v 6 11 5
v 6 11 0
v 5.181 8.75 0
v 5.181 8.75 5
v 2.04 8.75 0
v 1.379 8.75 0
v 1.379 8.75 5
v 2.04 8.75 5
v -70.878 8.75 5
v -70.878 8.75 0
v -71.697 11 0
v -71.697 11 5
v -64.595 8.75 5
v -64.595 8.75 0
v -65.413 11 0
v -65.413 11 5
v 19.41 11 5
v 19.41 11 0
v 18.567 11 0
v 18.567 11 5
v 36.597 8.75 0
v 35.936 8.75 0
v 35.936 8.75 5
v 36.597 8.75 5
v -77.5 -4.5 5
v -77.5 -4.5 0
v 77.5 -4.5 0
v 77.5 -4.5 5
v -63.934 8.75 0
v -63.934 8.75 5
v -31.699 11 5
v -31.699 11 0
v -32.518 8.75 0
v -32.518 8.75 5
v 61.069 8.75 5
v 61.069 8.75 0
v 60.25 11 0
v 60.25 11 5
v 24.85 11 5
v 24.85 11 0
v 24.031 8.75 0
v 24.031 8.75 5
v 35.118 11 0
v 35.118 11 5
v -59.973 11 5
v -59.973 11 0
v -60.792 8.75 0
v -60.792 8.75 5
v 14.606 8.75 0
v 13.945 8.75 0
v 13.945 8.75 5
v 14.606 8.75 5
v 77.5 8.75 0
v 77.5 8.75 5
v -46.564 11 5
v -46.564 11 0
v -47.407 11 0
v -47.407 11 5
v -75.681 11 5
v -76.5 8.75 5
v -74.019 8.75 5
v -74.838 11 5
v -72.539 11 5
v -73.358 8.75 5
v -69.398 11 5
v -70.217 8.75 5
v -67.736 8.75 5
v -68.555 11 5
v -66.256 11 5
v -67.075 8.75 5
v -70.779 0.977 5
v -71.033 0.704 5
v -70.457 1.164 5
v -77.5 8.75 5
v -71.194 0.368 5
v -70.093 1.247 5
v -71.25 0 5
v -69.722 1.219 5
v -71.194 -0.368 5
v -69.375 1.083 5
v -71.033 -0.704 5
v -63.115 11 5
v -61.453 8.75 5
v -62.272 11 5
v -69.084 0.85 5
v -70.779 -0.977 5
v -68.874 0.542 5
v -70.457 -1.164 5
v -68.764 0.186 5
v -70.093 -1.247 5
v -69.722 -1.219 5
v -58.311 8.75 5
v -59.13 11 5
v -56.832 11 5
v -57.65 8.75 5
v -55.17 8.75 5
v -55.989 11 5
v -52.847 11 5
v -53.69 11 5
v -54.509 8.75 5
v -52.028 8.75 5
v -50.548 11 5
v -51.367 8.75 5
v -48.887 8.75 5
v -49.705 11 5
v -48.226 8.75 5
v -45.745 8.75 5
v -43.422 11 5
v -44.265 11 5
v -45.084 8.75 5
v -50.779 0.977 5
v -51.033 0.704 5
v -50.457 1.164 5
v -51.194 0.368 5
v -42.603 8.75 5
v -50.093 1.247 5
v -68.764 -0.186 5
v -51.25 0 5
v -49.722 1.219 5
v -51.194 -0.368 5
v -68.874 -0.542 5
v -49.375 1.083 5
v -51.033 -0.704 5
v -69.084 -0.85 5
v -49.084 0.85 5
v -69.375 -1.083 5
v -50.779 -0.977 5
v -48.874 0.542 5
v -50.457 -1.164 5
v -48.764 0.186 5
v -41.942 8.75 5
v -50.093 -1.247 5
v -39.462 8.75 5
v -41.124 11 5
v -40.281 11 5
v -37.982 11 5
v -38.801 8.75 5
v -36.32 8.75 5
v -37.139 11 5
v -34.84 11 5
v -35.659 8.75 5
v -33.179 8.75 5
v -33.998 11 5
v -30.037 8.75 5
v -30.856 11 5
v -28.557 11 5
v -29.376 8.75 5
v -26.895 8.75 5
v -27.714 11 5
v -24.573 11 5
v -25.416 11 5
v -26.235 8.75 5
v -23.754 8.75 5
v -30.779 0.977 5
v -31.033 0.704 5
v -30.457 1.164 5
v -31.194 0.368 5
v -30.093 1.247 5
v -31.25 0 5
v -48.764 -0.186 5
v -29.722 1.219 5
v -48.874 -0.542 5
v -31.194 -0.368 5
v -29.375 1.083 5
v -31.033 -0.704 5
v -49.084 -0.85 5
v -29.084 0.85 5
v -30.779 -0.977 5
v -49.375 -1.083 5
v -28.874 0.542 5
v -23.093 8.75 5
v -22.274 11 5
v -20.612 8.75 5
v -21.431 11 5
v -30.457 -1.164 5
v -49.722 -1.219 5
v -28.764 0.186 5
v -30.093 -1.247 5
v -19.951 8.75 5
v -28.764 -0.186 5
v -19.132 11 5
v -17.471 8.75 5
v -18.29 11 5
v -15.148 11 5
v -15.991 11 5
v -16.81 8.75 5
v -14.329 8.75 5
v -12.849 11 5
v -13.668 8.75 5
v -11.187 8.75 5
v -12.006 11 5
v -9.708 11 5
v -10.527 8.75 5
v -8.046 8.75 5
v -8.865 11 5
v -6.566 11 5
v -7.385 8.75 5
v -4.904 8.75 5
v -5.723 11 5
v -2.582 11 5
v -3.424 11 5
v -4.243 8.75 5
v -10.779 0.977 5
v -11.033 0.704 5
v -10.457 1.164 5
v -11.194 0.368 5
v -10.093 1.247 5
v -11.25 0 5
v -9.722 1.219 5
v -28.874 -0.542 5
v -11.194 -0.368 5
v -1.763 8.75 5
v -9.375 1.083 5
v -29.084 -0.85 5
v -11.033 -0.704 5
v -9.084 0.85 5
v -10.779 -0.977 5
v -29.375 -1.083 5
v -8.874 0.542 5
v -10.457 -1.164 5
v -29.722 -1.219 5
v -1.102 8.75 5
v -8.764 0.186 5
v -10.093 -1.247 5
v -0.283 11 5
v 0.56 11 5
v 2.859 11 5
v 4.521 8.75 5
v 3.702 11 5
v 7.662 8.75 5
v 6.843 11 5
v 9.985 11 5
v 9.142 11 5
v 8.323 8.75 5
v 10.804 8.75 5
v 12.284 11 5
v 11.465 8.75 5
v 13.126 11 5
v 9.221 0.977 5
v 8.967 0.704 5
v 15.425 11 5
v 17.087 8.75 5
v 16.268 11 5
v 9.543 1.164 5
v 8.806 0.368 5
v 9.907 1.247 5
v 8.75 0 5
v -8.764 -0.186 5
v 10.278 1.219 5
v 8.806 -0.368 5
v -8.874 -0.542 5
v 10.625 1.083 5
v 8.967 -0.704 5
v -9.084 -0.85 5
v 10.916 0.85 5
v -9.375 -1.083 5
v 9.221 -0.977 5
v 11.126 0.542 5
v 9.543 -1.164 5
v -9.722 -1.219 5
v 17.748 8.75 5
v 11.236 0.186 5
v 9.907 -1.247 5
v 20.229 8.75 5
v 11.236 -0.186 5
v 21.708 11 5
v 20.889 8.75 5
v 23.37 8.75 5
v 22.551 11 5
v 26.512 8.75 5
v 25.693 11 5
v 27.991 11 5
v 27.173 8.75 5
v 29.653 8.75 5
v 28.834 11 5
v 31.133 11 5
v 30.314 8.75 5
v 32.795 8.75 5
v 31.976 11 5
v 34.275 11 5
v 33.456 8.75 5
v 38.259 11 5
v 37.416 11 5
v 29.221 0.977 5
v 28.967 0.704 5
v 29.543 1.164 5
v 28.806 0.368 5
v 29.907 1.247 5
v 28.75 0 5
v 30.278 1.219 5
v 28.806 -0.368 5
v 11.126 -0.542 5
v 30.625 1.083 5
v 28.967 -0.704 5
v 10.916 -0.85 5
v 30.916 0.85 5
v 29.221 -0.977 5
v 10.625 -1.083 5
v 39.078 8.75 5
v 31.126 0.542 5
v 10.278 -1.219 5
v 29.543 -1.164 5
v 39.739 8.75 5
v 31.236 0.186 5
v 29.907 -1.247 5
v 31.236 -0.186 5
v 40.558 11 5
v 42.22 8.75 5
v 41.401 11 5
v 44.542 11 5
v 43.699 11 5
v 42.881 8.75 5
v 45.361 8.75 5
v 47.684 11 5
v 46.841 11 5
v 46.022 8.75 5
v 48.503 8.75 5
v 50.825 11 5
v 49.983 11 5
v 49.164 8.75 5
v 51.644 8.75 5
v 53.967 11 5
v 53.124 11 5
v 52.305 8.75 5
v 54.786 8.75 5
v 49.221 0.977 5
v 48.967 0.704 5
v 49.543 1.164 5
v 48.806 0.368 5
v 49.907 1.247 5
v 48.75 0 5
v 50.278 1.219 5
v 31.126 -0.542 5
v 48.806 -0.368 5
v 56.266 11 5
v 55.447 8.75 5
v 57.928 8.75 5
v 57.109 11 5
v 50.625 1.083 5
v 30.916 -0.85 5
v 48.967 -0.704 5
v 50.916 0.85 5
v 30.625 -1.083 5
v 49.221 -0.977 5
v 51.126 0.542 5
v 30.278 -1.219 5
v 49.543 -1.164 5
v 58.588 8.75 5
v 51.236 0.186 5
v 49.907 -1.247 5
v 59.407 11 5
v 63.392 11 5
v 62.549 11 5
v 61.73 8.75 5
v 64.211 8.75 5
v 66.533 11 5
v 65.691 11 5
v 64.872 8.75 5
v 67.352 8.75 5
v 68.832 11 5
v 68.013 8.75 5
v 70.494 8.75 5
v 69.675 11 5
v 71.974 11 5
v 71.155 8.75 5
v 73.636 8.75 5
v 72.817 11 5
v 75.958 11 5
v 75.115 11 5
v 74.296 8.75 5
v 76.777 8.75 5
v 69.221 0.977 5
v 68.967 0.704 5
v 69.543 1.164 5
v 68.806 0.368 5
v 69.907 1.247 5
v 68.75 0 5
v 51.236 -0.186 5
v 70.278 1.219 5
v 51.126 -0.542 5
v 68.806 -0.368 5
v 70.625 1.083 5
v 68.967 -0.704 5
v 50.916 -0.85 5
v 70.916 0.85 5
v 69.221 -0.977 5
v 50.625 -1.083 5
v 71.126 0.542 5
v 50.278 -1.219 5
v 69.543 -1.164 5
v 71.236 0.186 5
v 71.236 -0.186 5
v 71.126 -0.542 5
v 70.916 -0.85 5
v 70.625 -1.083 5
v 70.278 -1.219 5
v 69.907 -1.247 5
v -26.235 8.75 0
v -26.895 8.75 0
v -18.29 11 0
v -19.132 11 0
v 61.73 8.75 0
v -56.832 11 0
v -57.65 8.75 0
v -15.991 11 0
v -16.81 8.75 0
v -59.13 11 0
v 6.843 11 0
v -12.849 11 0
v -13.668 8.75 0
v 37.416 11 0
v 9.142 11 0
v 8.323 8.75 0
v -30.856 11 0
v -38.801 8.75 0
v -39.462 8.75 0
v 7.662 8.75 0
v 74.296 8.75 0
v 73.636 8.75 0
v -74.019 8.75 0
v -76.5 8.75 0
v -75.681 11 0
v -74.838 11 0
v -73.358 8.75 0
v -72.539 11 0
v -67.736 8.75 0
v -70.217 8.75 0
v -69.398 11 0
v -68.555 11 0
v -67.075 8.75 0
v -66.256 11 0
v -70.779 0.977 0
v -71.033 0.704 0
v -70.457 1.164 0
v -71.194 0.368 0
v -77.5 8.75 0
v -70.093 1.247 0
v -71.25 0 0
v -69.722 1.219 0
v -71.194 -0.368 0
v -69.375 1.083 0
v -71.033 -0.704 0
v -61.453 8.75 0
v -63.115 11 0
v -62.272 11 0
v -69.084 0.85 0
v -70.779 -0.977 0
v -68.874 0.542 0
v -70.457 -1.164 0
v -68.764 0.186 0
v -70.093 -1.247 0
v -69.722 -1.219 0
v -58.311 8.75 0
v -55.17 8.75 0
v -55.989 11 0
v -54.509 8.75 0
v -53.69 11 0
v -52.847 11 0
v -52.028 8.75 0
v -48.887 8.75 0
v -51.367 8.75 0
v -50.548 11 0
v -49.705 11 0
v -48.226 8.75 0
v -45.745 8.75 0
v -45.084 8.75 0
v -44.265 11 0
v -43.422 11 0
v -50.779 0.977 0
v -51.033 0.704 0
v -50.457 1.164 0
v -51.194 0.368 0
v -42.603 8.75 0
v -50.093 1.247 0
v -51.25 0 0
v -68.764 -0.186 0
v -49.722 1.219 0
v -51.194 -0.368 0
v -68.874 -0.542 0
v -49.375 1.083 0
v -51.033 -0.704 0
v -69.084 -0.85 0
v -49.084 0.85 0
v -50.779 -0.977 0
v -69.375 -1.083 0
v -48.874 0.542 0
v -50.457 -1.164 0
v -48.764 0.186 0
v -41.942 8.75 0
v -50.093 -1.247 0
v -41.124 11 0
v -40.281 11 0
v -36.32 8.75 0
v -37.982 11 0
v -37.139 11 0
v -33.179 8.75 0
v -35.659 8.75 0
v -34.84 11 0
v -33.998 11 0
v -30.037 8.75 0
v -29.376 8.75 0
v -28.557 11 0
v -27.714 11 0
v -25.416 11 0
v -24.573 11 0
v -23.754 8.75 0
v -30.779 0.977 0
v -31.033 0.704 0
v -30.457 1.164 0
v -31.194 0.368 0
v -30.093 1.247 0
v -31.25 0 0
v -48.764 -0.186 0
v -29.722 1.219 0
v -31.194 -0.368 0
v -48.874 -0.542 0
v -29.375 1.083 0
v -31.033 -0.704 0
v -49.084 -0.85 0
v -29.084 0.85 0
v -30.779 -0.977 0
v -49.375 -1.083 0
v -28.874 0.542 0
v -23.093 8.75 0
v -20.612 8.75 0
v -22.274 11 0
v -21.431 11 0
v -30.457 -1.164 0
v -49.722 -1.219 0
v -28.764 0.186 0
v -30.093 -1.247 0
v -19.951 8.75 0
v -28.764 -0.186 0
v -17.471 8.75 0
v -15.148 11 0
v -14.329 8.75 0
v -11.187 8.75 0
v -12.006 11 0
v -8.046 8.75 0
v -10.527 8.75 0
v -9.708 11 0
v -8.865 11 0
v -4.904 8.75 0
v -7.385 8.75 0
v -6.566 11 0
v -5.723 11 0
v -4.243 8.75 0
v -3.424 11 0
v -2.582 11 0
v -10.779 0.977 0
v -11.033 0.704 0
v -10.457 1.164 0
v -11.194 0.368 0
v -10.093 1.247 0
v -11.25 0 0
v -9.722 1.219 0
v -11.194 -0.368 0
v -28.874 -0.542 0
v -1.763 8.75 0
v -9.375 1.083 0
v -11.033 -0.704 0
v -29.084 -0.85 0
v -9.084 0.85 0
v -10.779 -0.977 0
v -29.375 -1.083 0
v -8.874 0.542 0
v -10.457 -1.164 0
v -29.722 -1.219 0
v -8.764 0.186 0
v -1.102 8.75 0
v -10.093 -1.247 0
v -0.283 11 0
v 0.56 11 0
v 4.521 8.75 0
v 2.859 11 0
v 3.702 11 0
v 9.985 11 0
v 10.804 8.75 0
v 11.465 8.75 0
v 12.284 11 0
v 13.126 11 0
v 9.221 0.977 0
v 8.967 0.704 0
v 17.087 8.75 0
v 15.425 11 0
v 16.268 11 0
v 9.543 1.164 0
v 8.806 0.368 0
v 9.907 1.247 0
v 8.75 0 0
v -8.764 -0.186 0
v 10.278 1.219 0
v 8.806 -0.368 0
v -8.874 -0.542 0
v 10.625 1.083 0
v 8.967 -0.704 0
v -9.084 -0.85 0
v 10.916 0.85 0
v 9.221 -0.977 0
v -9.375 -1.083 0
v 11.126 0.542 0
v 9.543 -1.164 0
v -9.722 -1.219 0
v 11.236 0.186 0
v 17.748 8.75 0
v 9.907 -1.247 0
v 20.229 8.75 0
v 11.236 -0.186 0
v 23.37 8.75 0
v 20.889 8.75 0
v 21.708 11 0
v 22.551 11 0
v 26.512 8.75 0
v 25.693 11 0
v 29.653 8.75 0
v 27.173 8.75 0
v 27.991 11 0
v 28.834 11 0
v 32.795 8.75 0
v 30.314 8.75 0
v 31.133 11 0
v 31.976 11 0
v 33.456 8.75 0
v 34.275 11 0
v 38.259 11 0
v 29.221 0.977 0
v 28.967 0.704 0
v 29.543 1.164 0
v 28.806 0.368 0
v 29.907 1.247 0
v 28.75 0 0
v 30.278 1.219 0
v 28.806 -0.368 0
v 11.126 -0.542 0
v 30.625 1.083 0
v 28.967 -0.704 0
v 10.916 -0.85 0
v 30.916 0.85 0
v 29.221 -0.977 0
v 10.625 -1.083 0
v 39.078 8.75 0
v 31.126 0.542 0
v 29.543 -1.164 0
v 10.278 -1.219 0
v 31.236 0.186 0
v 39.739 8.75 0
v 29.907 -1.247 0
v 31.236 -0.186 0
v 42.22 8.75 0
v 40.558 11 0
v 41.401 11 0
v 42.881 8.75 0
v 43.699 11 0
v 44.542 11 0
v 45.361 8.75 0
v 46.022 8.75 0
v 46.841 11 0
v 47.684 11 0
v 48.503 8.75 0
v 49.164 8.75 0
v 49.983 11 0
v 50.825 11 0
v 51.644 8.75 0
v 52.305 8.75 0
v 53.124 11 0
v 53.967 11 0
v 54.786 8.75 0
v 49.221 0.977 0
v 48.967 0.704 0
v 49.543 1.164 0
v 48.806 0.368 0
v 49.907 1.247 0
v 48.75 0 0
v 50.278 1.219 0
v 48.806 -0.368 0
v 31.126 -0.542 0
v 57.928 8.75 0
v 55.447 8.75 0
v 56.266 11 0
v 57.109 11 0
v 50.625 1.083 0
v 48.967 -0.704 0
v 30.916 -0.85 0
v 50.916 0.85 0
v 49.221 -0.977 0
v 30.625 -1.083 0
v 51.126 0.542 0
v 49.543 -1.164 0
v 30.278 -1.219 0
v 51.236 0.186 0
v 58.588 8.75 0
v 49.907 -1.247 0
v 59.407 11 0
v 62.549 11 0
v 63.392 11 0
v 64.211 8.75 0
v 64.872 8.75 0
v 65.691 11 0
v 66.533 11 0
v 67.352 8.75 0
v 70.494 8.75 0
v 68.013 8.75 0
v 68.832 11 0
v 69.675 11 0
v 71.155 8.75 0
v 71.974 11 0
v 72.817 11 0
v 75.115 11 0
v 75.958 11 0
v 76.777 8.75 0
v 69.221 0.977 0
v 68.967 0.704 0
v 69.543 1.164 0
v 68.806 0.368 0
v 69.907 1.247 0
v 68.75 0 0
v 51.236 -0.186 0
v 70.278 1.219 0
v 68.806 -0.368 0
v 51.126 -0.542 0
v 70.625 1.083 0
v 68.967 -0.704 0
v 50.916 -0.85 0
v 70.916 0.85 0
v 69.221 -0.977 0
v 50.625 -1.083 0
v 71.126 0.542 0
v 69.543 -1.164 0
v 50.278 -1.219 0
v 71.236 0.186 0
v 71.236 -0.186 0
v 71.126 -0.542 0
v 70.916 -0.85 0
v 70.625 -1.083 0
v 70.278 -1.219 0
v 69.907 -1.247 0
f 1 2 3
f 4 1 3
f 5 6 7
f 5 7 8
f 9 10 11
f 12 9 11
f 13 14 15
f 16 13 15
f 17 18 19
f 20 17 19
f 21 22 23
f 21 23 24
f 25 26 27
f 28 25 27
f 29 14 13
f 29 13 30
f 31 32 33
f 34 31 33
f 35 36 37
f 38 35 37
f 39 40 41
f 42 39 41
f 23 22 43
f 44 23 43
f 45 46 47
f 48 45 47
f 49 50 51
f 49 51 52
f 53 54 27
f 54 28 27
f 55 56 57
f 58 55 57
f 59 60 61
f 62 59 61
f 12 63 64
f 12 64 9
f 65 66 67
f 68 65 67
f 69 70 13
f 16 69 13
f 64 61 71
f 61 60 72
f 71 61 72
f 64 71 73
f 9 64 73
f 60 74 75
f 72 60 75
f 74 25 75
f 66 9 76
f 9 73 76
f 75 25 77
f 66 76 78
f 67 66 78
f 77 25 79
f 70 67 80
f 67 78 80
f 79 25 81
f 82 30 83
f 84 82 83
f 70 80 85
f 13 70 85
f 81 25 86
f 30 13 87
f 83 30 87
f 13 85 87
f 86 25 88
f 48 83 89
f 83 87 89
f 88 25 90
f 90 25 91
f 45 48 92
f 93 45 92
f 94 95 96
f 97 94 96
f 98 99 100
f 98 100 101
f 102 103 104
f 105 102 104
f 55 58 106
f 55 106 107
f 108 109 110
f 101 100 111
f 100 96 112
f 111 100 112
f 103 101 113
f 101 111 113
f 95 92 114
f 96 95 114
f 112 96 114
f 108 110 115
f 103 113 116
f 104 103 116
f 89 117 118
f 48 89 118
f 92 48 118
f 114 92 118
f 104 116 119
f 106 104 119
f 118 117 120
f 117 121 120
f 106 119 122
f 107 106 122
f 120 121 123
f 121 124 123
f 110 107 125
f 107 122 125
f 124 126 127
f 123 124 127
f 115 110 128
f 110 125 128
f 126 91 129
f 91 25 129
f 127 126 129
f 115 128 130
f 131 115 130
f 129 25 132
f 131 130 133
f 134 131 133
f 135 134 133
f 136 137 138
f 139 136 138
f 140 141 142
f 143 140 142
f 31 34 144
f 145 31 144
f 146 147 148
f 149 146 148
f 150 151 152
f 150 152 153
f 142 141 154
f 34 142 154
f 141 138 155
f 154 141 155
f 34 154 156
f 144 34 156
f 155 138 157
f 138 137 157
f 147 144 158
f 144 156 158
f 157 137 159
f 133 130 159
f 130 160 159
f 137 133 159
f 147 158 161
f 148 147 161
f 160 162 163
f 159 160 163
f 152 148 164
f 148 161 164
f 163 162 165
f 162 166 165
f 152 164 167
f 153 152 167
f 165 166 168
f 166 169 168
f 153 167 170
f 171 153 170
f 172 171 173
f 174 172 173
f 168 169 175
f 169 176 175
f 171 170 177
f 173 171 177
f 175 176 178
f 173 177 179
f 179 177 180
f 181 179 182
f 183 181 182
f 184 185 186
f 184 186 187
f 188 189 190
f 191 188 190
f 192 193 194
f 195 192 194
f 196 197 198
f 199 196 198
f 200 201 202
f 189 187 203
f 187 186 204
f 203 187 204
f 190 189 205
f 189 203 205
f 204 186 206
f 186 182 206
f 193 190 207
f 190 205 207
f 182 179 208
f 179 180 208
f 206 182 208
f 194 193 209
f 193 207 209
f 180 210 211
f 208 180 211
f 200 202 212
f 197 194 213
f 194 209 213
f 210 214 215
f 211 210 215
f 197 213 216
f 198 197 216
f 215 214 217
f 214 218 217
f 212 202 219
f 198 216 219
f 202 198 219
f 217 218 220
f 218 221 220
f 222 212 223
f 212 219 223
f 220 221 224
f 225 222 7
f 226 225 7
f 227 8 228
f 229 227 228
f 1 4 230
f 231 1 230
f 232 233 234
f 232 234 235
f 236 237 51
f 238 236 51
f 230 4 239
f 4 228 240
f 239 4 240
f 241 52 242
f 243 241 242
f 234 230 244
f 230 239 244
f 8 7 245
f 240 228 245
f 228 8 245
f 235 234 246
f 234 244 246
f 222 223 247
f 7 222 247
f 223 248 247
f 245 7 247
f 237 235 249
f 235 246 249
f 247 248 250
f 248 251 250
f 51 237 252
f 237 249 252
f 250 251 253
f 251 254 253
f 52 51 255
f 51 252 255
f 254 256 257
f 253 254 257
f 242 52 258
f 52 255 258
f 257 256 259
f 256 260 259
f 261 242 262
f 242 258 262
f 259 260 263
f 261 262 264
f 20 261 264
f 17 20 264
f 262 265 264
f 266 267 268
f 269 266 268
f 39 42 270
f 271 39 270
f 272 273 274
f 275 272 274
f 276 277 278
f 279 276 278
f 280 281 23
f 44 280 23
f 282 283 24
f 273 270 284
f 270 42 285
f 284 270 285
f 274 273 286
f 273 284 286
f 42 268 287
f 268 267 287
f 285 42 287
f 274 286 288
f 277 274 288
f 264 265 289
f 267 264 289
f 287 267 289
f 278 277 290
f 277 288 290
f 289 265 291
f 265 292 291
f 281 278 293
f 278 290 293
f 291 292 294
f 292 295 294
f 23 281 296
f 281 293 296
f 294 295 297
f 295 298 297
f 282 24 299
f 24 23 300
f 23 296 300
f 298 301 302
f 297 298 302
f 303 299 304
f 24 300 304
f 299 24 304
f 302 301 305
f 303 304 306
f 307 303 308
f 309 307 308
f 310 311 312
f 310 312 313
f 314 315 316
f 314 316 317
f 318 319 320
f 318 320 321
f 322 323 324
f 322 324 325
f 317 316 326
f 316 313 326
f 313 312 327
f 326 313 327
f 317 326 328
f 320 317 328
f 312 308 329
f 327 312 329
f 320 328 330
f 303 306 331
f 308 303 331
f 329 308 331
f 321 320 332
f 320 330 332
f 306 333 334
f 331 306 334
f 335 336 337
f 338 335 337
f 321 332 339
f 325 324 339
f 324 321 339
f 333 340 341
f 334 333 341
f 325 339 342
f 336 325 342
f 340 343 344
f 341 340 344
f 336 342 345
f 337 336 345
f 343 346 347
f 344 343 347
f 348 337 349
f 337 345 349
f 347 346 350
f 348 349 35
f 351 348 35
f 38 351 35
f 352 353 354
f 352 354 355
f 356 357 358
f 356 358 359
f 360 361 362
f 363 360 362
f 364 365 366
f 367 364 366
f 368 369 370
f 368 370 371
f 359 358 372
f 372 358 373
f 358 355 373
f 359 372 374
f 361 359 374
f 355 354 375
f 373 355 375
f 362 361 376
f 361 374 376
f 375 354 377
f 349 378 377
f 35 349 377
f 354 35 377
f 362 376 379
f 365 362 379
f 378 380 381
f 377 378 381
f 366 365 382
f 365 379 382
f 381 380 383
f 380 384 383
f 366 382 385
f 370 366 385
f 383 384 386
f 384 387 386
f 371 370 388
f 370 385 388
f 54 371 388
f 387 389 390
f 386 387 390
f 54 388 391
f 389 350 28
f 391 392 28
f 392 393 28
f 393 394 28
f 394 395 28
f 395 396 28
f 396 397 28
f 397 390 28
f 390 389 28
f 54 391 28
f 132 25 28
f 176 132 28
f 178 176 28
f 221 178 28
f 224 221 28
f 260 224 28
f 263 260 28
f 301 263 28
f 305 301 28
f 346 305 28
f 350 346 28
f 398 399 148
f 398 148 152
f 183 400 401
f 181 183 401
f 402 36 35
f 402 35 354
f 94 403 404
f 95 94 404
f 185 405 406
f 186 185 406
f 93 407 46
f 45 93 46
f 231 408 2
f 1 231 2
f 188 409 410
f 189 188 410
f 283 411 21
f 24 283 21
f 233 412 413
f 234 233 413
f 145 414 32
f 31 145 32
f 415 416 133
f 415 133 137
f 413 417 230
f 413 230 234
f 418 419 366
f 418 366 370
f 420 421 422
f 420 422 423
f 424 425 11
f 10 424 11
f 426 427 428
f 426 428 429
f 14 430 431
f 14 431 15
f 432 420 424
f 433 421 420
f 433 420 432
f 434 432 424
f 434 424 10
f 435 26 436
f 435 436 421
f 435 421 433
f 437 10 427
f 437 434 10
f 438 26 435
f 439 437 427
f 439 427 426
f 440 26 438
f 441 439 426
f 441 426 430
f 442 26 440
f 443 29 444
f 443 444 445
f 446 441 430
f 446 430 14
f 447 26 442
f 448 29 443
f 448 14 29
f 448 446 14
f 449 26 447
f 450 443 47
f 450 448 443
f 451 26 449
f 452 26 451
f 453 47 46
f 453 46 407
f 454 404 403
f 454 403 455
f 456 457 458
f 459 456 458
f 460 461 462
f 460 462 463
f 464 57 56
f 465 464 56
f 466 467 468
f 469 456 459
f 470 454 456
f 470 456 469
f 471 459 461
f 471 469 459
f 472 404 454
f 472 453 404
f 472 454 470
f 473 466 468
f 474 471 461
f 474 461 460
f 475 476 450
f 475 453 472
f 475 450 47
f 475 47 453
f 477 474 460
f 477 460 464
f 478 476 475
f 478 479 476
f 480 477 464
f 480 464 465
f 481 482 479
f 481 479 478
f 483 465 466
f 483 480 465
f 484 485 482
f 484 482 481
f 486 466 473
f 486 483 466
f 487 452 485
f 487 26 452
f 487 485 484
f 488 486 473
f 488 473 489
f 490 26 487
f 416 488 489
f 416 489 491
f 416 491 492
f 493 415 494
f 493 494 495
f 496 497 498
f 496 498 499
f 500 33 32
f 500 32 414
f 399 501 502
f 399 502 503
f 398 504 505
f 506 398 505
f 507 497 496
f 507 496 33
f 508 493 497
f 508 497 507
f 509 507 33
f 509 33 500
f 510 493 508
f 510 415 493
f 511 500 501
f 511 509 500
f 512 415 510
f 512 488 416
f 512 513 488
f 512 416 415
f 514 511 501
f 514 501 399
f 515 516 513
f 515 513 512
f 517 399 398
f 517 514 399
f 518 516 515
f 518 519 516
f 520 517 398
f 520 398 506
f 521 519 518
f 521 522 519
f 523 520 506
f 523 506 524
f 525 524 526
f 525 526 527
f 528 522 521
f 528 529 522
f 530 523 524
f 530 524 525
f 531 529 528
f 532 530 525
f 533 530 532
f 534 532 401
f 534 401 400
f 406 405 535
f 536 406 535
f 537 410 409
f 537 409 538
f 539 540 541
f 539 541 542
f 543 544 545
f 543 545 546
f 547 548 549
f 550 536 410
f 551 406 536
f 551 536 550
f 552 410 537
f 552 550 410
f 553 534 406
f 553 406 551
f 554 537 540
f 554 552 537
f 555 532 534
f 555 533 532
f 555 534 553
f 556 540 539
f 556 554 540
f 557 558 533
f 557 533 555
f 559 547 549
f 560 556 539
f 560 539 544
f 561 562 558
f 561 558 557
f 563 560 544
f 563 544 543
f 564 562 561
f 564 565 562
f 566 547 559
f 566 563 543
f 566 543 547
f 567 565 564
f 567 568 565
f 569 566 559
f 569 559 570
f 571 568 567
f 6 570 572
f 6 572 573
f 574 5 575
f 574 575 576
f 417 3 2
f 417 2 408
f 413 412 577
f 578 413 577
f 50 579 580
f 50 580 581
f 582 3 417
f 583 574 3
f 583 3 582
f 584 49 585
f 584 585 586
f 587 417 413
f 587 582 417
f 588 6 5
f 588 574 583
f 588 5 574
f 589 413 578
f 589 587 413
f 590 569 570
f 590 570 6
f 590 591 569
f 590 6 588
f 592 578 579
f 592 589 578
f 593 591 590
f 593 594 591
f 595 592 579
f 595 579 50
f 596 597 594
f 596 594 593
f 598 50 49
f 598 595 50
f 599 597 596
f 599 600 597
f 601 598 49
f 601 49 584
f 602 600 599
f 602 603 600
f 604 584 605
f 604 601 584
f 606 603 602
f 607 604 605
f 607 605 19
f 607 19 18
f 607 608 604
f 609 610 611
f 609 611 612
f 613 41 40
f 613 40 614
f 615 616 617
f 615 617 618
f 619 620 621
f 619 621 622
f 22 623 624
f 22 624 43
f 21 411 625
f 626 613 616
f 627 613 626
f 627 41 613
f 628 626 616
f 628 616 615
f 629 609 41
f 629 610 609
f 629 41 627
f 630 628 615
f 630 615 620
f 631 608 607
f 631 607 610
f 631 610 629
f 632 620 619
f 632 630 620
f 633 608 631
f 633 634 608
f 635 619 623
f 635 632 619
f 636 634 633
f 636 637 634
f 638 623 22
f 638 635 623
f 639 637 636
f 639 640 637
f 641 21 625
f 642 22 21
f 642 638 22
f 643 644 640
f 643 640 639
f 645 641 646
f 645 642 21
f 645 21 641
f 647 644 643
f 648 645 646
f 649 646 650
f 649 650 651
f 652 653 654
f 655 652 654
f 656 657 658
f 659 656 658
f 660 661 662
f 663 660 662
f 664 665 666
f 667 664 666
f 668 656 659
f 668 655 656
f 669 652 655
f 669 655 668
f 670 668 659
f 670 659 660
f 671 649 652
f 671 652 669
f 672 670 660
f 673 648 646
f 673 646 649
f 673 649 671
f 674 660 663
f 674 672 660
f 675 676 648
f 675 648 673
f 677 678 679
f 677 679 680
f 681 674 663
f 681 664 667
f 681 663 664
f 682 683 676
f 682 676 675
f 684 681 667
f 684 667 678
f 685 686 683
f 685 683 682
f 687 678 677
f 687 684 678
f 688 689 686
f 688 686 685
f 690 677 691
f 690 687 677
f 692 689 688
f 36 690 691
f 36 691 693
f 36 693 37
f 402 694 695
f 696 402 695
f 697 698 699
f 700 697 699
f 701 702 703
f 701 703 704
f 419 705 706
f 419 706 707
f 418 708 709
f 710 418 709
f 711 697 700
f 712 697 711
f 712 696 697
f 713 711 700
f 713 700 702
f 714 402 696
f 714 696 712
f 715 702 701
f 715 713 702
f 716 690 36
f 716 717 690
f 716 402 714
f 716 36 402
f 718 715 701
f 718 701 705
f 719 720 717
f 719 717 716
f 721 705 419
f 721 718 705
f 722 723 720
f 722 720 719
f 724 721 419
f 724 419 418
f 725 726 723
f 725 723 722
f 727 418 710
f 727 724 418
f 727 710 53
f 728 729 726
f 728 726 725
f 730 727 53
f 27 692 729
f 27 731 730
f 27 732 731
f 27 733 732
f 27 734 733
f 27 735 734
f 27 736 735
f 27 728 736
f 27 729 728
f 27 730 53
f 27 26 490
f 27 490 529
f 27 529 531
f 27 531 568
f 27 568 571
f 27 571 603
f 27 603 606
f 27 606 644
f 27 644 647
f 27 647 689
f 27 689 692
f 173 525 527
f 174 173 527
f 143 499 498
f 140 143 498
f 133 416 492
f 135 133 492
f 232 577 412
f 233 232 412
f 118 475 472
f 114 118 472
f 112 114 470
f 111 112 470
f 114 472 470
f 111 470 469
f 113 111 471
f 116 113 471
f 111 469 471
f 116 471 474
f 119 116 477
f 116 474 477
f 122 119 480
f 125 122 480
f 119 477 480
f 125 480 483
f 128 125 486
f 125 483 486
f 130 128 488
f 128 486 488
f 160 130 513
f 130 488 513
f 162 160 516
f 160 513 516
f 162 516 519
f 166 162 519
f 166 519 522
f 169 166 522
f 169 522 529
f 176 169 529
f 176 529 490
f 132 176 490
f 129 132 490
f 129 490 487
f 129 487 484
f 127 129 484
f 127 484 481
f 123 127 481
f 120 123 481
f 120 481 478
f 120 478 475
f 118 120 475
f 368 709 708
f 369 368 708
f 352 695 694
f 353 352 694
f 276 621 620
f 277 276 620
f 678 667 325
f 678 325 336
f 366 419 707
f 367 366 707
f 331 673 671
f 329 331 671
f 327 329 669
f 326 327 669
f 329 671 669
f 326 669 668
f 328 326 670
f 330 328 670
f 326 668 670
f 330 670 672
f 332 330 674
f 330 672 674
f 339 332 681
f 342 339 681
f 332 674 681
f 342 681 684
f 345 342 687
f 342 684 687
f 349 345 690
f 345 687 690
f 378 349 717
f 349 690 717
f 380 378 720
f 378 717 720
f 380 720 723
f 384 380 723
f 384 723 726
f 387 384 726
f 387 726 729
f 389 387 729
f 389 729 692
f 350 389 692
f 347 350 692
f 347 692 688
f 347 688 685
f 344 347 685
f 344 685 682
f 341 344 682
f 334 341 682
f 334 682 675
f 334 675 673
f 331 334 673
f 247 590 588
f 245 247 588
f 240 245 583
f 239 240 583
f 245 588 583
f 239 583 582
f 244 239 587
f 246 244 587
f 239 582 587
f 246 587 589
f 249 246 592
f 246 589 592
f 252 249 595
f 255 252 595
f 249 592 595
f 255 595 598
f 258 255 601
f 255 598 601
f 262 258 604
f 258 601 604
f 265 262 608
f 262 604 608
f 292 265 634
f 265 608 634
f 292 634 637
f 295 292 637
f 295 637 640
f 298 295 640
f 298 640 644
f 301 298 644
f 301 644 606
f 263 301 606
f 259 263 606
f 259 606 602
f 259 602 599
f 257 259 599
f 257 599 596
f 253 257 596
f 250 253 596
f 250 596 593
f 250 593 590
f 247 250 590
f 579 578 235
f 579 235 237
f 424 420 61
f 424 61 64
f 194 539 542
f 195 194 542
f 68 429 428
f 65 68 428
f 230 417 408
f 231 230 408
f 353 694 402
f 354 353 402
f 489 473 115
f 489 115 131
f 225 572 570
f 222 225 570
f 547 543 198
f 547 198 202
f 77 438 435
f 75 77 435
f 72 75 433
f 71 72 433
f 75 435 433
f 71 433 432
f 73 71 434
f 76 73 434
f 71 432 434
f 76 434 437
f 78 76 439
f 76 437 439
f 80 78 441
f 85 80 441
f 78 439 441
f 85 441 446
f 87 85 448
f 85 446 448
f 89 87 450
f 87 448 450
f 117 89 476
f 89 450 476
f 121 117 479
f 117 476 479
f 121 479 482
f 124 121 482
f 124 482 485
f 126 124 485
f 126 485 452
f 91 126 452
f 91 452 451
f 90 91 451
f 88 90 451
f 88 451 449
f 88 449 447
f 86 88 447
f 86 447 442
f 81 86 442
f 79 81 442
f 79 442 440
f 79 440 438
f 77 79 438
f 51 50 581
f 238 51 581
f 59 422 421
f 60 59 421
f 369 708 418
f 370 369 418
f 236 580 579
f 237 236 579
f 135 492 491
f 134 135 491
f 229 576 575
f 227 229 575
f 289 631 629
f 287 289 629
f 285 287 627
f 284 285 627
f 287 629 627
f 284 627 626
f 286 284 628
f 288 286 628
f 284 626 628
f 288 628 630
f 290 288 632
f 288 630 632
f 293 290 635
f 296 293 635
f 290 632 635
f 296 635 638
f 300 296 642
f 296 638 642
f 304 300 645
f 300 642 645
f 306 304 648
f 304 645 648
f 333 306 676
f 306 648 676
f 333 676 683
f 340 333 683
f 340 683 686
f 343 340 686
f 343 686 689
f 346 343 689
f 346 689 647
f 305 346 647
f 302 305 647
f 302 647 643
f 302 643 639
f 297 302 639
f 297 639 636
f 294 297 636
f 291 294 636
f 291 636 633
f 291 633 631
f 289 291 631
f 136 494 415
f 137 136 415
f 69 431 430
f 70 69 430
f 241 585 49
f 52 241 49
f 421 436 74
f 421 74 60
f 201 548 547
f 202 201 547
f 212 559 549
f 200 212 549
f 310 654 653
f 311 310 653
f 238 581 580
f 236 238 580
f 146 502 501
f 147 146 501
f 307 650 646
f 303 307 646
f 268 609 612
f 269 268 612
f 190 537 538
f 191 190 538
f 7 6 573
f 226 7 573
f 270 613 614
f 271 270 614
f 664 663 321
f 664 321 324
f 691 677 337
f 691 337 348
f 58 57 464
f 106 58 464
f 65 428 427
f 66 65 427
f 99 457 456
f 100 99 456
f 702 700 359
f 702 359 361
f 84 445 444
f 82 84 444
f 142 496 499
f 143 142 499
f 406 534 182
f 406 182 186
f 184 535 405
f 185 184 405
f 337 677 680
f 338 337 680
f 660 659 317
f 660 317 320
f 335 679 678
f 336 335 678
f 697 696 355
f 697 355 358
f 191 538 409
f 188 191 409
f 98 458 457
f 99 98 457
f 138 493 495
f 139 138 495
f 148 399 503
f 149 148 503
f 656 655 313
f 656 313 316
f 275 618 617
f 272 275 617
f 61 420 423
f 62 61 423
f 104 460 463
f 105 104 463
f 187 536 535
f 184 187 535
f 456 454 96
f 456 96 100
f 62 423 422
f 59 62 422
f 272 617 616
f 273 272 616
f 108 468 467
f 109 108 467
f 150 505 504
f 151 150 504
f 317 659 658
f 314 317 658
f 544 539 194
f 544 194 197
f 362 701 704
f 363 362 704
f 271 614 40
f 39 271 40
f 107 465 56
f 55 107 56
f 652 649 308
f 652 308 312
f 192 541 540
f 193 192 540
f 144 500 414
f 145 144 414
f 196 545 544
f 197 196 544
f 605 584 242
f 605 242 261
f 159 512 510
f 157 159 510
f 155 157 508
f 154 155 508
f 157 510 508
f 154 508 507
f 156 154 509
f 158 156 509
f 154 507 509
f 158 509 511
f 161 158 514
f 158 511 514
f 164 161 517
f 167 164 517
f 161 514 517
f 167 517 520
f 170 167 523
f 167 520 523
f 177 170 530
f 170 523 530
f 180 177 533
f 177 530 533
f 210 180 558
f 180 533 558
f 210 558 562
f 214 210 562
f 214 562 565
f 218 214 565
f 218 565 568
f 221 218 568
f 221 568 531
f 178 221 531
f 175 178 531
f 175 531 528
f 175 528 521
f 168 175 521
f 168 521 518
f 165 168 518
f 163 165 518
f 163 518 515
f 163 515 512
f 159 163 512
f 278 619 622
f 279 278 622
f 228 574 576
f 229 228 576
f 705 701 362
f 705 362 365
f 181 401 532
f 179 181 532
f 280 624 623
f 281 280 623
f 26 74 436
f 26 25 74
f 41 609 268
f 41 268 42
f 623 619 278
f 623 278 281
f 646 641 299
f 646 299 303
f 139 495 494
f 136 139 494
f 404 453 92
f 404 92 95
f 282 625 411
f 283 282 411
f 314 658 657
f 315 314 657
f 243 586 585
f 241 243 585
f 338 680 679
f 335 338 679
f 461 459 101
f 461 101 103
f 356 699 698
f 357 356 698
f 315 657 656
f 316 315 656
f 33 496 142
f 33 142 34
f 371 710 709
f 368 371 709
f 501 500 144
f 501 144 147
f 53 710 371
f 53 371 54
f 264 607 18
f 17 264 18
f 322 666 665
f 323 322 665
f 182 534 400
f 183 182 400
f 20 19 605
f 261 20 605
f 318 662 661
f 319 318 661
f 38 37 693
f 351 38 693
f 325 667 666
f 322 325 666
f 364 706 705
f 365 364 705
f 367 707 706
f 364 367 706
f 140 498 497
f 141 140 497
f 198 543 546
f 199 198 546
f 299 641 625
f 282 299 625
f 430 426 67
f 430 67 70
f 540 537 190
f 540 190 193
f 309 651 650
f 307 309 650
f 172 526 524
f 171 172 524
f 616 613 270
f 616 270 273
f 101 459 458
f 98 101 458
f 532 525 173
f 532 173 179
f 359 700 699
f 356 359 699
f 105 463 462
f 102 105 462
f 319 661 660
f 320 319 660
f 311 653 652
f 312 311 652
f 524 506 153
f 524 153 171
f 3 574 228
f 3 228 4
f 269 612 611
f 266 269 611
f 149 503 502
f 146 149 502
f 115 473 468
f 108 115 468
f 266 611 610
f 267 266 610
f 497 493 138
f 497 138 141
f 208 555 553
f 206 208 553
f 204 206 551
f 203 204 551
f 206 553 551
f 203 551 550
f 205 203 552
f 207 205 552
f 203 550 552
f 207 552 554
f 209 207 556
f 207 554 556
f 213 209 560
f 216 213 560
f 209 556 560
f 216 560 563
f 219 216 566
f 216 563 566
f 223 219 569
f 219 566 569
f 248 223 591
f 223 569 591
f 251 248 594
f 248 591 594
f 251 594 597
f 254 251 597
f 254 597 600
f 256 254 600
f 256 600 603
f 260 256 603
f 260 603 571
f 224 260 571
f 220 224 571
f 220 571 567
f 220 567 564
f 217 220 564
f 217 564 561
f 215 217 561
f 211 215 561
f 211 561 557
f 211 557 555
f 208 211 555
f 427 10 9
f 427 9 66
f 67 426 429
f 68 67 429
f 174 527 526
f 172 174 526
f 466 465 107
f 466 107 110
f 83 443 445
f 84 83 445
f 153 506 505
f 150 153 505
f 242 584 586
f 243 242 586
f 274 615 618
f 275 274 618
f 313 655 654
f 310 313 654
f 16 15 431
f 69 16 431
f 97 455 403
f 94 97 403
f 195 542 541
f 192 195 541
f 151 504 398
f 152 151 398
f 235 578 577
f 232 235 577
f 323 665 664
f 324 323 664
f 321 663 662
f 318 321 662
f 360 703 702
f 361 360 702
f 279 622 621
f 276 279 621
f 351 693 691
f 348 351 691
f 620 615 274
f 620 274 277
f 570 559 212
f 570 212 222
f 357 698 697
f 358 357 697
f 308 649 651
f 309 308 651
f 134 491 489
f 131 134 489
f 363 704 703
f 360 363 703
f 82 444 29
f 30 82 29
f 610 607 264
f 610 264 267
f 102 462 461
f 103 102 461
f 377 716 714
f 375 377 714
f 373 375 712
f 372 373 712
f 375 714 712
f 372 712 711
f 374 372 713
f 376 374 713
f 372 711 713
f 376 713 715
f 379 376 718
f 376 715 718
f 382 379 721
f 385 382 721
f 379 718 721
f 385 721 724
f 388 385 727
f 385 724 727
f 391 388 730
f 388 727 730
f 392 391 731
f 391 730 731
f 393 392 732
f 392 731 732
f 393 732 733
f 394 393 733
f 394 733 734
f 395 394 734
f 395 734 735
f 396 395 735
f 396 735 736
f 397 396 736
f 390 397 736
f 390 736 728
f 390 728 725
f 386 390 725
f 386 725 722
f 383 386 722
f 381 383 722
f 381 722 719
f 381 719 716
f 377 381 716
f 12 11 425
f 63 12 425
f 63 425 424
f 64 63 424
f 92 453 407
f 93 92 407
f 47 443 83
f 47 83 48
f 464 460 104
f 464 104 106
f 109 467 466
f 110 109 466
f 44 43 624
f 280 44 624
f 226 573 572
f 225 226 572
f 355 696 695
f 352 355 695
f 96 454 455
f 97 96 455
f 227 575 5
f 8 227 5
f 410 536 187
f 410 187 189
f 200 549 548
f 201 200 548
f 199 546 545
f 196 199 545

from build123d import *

# Parameters (mm, degrees)
SKETCH_1_W             = 155
SKETCH_1_H             = 9
EXTRUDE_1_DEPTH        = 5
SKETCH_3_W             = 155
SKETCH_3_H             = 5
EXTRUDE_2_DEPTH        = 4.25
EXTRUDE_3_DEPTH        = 5
M3X0_5_1_D             = 2.5
PATTERN_LINEAR_1_COUNT = 49
PATTERN_LINEAR_1_PITCH = 3.141592654
PATTERN_LINEAR_2_COUNT = 8
PATTERN_LINEAR_2_PITCH = 20


with BuildPart() as part:
    # 草圖1 → 填料-伸長1 (new body)
    with BuildSketch(Plane.XY):
        Rectangle(SKETCH_1_W, SKETCH_1_H)
    extrude(amount=EXTRUDE_1_DEPTH)

    # 草圖3 → 填料-伸長2 (add)
    with BuildSketch(Plane(origin=(0, 4.5, 0), x_dir=(1, 0, 0), z_dir=(0, 1, 0))):
        with Locations((0, -2.5)):
            Rectangle(SKETCH_3_W, SKETCH_3_H)
    extrude(amount=EXTRUDE_2_DEPTH)

    # 草圖4 → 填料-伸長3 (add, through all)
    with BuildSketch(Plane.XY):
        Polygon((-76.5, 8.75), (-74.019278088, 8.75), (-74.838211115, 11), (-75.681066973, 11), align=None)
    extrude_3 = extrude(amount=EXTRUDE_3_DEPTH)

    # M3x0.5 螺紋孔1 (through all)
    with Locations(Plane.XY.offset(5)):
        with Locations((-70, 0)):
            m3x0_5_1 = Hole(M3X0_5_1_D / 2)

    # 直線複製排列1: 填料-伸長3 ×49
    with Locations(*[(i * PATTERN_LINEAR_1_PITCH, 0, 0) for i in range(1, PATTERN_LINEAR_1_COUNT)]):
        add(extrude_3)

    # 直線複製排列2: M3x0.5 螺紋孔1 ×8
    with Locations(*[(i * PATTERN_LINEAR_2_PITCH, 0, 0) for i in range(1, PATTERN_LINEAR_2_COUNT)]):
        add(m3x0_5_1, mode=Mode.SUBTRACT)


solid = part.part
